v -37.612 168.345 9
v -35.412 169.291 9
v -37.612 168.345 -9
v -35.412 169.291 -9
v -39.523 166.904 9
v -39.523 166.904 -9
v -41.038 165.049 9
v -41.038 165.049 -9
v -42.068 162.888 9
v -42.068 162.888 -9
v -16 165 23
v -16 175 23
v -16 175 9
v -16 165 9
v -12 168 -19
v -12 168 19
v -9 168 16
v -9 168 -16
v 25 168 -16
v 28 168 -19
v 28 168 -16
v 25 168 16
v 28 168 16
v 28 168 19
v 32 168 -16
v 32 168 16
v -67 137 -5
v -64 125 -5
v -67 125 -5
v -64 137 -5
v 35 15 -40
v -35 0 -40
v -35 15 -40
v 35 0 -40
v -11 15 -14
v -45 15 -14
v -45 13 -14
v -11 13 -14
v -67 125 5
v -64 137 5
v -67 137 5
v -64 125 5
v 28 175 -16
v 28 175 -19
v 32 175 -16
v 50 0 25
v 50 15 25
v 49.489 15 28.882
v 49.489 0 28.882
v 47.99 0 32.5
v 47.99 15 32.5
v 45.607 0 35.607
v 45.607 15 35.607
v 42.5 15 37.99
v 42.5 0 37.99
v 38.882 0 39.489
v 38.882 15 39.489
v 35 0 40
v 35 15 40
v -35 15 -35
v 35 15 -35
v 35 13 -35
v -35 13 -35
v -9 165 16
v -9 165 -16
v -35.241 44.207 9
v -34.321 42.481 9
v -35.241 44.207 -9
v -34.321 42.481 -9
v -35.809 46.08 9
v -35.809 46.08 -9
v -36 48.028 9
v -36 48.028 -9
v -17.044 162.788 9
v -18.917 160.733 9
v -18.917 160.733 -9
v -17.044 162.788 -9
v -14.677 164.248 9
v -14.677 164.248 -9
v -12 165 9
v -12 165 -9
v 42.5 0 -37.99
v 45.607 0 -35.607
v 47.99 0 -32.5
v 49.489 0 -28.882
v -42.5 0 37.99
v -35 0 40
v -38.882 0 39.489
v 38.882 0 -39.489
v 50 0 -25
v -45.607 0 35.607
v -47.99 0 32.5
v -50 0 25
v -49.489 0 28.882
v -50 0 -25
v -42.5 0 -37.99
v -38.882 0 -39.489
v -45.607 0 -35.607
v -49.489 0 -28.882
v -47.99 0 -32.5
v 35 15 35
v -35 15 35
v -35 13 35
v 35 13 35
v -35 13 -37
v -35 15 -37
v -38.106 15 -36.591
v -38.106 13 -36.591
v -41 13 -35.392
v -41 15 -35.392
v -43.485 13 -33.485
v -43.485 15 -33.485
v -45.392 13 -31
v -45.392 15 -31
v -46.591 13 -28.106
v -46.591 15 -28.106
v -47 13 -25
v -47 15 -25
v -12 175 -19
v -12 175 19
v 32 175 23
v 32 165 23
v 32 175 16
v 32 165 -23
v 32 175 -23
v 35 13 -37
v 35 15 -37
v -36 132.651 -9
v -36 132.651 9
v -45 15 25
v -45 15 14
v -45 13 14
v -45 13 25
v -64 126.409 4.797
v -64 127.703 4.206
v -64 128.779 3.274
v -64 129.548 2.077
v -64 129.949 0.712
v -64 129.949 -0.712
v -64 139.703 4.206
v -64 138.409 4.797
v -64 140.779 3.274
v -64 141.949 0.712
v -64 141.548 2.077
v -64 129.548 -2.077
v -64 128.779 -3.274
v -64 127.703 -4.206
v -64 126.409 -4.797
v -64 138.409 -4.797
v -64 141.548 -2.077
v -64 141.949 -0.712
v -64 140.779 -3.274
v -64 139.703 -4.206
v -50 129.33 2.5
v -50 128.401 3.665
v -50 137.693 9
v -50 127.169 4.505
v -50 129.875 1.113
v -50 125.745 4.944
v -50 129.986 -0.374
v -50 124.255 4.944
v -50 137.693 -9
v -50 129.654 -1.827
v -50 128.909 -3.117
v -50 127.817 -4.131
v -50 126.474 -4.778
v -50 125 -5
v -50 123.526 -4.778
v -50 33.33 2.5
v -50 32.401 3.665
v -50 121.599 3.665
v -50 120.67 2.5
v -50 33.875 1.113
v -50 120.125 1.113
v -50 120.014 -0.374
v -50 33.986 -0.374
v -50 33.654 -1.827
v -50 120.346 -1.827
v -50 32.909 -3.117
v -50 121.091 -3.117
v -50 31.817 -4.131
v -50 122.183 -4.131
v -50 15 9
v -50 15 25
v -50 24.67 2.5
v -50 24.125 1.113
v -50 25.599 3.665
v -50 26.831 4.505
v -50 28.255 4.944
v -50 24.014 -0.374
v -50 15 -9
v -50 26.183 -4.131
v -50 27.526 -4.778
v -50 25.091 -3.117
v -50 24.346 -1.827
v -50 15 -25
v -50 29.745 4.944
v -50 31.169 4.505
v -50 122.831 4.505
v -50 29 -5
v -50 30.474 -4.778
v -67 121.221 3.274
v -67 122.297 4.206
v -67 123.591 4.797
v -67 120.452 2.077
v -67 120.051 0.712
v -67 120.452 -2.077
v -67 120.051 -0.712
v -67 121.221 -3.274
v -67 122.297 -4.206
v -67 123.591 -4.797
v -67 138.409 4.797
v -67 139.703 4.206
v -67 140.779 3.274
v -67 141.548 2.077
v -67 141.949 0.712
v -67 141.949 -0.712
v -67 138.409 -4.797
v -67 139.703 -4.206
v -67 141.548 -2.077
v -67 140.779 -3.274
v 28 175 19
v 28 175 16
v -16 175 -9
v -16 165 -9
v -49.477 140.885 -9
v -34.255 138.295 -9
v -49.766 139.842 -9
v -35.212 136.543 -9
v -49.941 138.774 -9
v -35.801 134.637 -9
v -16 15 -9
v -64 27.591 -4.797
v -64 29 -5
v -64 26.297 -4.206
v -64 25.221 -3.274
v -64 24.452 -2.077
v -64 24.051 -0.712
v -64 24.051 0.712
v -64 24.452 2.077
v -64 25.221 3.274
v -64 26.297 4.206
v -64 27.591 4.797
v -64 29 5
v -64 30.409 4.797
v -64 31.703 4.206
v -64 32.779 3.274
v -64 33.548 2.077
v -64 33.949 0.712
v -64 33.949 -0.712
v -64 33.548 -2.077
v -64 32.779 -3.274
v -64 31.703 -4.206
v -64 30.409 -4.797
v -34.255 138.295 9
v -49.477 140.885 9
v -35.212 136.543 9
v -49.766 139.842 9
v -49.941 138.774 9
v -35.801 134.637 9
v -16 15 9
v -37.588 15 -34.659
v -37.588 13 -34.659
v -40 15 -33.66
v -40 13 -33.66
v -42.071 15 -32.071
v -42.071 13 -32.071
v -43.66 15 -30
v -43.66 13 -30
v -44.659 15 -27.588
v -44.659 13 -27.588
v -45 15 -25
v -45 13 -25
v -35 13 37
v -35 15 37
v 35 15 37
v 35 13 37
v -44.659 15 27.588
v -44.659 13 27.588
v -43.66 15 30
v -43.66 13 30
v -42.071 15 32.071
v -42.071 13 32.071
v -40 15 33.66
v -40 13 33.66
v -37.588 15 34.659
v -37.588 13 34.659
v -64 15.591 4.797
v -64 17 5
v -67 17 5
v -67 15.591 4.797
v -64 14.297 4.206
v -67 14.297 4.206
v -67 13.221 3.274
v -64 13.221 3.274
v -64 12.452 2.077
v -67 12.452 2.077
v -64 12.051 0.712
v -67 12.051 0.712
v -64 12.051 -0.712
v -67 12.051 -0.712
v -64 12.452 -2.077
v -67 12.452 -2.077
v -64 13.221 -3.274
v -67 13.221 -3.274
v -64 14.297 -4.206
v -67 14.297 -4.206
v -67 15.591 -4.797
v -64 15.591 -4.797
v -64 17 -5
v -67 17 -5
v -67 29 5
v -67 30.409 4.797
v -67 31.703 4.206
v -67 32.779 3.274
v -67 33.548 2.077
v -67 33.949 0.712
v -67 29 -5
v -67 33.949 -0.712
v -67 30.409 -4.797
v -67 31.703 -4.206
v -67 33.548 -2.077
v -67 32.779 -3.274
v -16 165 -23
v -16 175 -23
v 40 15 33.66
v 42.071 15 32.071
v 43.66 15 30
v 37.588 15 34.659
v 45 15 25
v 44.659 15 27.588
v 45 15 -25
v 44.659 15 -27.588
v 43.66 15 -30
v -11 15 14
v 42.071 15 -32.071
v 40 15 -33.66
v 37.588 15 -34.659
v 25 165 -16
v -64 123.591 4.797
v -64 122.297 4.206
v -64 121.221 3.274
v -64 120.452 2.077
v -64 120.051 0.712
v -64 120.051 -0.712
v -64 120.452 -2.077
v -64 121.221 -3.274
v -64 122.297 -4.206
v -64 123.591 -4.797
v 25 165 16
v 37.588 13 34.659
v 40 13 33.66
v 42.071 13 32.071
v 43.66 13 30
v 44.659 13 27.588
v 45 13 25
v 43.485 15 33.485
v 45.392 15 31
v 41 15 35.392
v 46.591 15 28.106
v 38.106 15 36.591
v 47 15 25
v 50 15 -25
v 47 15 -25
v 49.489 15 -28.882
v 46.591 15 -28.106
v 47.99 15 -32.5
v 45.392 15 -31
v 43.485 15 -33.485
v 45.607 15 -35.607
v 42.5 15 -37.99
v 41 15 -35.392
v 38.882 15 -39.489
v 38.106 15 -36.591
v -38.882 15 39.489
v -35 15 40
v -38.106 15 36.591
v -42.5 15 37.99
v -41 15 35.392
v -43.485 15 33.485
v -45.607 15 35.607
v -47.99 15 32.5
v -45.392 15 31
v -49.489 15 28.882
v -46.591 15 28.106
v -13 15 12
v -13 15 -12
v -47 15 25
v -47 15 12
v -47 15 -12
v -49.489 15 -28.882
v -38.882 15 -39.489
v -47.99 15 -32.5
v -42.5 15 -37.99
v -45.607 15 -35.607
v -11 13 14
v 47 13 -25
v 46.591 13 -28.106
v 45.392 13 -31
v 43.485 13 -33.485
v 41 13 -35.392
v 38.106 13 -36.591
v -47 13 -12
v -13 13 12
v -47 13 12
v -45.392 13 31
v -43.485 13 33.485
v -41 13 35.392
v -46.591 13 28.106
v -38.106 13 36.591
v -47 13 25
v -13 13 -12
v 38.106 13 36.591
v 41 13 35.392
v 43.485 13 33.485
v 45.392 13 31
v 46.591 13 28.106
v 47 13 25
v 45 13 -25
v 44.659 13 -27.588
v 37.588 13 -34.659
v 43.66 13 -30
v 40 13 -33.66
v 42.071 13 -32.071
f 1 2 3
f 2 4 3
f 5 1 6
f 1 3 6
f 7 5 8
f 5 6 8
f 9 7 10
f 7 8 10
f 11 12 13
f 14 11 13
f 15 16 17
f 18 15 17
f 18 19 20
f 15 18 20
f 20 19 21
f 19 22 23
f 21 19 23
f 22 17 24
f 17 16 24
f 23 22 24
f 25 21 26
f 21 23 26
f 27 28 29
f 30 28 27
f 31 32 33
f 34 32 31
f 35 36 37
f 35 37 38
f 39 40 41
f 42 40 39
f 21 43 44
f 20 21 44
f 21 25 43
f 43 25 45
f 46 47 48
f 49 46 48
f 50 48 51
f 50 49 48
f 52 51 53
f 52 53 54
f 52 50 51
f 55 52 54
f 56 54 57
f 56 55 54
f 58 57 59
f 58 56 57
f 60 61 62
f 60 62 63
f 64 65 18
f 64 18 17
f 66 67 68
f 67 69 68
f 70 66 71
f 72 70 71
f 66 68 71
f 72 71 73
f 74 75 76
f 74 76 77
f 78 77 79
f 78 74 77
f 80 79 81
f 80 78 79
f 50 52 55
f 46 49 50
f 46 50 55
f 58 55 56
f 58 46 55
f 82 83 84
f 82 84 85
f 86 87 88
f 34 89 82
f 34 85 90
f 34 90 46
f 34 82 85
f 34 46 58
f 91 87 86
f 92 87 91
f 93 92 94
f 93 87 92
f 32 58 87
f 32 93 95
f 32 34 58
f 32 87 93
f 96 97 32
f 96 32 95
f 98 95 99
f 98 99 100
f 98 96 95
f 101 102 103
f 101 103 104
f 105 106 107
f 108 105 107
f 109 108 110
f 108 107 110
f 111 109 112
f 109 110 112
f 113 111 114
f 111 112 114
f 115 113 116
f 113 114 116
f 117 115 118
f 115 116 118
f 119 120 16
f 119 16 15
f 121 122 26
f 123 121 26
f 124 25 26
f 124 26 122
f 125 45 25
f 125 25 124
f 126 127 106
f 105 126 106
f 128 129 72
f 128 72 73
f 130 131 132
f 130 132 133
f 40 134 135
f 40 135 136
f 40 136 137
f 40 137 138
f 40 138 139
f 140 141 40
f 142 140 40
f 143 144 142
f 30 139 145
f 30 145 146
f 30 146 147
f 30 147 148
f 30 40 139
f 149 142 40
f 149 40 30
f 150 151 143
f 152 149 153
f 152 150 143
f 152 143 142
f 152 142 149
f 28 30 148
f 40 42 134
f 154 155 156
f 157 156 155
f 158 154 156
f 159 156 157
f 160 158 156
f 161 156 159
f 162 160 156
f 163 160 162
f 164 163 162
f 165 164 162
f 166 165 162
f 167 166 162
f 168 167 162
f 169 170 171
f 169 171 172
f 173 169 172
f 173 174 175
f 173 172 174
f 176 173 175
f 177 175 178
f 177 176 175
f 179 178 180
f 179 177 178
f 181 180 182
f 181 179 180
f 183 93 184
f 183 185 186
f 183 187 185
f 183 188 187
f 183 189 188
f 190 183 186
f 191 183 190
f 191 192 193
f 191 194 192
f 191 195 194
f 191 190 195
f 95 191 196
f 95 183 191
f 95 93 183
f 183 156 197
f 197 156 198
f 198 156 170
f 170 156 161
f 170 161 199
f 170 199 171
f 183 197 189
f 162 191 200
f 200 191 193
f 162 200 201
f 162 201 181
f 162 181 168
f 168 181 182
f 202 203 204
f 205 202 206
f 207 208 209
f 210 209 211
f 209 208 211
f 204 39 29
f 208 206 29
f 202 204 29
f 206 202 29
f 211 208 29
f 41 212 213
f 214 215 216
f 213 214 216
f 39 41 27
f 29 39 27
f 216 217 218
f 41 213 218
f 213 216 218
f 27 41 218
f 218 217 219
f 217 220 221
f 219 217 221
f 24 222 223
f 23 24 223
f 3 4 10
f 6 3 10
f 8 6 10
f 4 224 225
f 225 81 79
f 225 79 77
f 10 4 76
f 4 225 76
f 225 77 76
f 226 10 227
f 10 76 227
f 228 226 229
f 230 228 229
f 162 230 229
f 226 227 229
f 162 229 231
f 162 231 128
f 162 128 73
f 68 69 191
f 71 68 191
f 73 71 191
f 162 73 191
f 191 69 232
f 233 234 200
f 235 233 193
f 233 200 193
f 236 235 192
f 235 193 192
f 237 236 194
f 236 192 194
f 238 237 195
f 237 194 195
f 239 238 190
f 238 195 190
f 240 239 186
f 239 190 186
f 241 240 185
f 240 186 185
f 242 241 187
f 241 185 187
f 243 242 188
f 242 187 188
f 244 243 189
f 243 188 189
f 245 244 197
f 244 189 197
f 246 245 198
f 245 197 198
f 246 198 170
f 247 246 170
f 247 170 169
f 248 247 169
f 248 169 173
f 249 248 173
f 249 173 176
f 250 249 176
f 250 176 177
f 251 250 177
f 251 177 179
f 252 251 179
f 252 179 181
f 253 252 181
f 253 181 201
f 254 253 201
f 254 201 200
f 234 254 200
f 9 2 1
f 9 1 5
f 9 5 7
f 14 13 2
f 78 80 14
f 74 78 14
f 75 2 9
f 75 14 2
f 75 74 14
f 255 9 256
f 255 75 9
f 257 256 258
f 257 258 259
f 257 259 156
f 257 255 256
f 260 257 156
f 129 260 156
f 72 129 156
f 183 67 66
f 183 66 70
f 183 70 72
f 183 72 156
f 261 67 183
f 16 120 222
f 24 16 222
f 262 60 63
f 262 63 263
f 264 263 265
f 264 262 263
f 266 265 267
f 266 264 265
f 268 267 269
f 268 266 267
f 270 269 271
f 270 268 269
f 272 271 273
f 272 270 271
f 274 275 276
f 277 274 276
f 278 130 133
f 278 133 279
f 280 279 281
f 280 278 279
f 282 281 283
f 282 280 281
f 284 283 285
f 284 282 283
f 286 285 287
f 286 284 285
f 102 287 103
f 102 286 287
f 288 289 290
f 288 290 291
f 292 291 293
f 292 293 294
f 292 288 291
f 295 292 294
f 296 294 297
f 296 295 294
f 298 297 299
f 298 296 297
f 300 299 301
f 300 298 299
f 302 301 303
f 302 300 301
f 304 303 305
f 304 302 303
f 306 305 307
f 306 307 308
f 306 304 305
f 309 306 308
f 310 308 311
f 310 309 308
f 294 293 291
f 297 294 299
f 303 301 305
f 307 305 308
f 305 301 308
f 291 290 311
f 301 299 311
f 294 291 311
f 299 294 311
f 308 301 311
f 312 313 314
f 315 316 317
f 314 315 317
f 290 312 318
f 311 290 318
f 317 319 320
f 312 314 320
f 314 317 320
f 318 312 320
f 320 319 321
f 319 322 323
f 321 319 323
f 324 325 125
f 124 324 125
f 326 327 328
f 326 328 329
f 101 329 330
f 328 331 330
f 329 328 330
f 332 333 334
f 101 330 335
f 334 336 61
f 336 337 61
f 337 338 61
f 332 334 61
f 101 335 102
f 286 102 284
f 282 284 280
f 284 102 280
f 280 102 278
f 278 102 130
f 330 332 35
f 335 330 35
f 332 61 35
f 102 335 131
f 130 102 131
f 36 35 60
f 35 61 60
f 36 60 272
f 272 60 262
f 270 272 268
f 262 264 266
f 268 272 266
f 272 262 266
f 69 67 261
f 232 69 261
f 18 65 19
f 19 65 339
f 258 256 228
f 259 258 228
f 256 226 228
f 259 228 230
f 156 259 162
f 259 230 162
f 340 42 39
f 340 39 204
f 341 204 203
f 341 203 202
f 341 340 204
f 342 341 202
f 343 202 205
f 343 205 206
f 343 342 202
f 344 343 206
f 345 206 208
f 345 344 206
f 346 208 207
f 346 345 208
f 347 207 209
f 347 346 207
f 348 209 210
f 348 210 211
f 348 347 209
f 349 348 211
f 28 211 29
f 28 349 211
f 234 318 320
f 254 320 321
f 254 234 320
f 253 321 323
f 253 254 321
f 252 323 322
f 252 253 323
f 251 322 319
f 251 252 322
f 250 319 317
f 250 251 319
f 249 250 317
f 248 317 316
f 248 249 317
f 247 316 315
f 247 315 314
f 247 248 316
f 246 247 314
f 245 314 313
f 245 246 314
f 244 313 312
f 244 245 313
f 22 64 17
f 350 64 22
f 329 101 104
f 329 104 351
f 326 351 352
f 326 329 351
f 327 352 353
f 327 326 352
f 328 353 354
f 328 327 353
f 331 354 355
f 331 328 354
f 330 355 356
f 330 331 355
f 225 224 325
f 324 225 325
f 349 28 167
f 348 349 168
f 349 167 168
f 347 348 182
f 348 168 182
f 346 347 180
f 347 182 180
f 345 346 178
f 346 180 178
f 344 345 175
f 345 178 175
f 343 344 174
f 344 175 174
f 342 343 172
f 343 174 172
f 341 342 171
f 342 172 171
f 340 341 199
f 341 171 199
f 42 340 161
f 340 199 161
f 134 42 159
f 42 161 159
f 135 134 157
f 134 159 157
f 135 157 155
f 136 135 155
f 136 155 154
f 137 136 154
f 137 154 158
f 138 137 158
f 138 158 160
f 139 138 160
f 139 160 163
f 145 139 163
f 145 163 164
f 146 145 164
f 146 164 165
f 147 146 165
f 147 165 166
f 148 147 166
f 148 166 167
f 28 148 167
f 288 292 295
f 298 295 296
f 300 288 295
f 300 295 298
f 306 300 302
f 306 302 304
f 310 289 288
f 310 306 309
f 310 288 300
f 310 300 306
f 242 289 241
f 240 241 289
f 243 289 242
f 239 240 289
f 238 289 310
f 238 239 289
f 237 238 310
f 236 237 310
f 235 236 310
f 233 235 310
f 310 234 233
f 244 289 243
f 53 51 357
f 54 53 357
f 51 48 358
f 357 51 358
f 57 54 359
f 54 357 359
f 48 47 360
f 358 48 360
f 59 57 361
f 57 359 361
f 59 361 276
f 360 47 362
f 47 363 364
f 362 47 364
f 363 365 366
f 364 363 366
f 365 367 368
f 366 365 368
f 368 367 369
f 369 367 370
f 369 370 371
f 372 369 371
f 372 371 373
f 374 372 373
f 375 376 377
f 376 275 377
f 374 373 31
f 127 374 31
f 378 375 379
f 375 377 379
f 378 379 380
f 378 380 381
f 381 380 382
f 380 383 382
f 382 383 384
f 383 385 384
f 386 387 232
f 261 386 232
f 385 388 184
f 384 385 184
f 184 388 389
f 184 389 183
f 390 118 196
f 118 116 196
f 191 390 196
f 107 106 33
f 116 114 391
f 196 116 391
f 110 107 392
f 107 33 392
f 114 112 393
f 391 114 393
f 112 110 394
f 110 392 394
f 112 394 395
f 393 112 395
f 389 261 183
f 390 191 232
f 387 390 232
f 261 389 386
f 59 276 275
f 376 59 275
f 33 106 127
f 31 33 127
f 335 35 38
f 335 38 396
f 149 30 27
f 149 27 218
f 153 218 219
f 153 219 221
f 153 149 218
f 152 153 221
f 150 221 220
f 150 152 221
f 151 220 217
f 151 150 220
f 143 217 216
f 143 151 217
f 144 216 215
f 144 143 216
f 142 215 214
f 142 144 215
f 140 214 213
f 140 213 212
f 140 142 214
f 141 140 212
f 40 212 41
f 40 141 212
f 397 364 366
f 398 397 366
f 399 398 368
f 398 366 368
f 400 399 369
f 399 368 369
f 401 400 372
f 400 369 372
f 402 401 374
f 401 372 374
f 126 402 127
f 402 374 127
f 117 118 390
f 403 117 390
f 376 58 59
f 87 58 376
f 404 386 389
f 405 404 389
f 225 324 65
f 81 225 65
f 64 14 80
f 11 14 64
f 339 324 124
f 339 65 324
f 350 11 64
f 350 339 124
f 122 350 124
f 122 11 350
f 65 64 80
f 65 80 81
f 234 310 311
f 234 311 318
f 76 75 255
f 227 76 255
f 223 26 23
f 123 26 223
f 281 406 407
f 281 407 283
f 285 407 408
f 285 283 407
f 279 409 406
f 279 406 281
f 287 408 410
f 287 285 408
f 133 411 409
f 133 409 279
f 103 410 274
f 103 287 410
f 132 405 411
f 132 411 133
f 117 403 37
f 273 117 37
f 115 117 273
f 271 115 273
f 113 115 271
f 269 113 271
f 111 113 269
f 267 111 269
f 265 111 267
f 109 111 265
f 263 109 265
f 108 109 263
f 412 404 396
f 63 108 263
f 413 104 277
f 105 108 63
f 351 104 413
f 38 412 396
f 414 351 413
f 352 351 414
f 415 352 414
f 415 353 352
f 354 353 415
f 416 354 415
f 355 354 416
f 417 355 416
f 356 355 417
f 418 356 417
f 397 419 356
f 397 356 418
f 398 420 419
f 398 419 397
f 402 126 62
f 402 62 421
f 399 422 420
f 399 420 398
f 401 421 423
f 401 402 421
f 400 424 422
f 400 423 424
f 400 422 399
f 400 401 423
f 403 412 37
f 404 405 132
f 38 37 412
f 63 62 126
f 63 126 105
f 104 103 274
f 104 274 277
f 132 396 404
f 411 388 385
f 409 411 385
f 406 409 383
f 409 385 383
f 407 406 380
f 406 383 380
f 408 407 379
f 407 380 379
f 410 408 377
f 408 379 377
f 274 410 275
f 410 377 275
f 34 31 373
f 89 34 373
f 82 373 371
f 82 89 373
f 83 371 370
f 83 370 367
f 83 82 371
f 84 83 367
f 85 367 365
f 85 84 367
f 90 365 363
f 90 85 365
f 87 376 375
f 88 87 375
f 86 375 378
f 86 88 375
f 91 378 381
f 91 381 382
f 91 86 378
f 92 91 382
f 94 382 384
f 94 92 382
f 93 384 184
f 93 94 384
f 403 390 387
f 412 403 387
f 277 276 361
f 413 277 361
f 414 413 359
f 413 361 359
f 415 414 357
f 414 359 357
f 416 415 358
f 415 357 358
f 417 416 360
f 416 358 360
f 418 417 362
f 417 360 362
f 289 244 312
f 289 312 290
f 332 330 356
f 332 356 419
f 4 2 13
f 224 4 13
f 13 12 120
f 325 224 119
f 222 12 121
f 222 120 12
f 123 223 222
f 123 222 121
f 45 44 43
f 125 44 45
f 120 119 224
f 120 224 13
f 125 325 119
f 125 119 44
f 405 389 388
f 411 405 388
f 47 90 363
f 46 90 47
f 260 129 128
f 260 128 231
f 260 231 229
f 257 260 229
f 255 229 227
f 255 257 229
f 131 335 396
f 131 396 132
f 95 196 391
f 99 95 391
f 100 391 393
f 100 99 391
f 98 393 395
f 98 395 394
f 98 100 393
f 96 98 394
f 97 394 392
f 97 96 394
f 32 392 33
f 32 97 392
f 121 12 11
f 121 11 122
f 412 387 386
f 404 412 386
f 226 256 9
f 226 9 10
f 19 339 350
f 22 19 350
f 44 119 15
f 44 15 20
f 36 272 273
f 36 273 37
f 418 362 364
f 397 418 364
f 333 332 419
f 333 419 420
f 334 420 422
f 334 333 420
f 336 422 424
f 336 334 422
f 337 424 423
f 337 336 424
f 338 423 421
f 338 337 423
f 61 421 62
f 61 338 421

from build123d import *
from build123d.topology import SkipClean

# Parameters (mm, degrees)
BOSS_EXTRUDE1_DEPTH  = 15
SKETCH3_W            = 14
SKETCH3_H            = 18
BOSS_EXTRUDE2_DEPTH  = 150
BOSS_EXTRUDE3_DEPTH  = 18
SKETCH7_W            = 48
SKETCH7_H            = 46
SKETCH7_W_2          = 40
SKETCH7_H_2          = 38
BOSS_EXTRUDE4_DEPTH  = 10
BOSS_EXTRUDE5_DEPTH  = 18
FILLET2_R            = 10
CHAMFER2_SIZE        = 10
CHAMFER2_SIZE2       = 25.668100083
FILLET3_R            = 10
FILLET4_R            = 10
SKETCH11_W           = 40
SKETCH11_H           = 38
SKETCH11_W_2         = 34
SKETCH11_H_2         = 32
BOSS_EXTRUDE6_DEPTH  = 3
SKETCH12_W           = 32
SKETCH12_H           = 7
CUT_EXTRUDE2_DEPTH   = 5
CUT_EXTRUDE3_DEPTH   = 2
SKETCH15_R           = 5
BOSS_EXTRUDE8_DEPTH  = 14
BOSS_EXTRUDE10_DEPTH = 3


with BuildPart() as part:
    # Sketch1 → Boss-Extrude1 (new body)
    with BuildSketch(Plane(origin=(0, 0, 0), x_dir=(1, 0, 0), z_dir=(0, 1, 0))):
        with BuildLine():
            Line((35, -40), (-35, -40))
            ThreePointArc((-35, -40), (-45.606601718, -35.606601718), (-50, -25))
            Line((-50, -25), (-50, 25))
            ThreePointArc((-50, 25), (-45.606601718, 35.606601718), (-35, 40))
            Line((-35, 40), (35, 40))
            ThreePointArc((35, 40), (45.606601718, 35.606601718), (50, 25))
            Line((50, 25), (50, -25))
            ThreePointArc((50, -25), (45.606601718, -35.606601718), (35, -40))
        make_face()
    extrude(amount=BOSS_EXTRUDE1_DEPTH)

    # Sketch3 → Boss-Extrude2 (add)
    with BuildSketch(Plane(origin=(0, 15, 0), x_dir=(1, 0, 0), z_dir=(0, 1, 0))):
        with Locations((-43, 0)):
            Rectangle(SKETCH3_W, SKETCH3_H)
    extrude(amount=BOSS_EXTRUDE2_DEPTH)

    # Sketch5 → Boss-Extrude3 (add)
    with BuildSketch(Plane.XY.offset(9)):
        Polygon((-36, 15), (-36, 45), (-16, 15), align=None)
    extrude(amount=-BOSS_EXTRUDE3_DEPTH)



with BuildPart() as body_2:
    # Sketch7 → Boss-Extrude4 (new body)
    with BuildSketch(Plane(origin=(0, 175, 0), x_dir=(1, 0, 0), z_dir=(0, 1, 0))):
        with Locations((8, 0)):
            Rectangle(SKETCH7_W, SKETCH7_H)
        with Locations((8, 0)):
            Rectangle(SKETCH7_W_2, SKETCH7_H_2, mode=Mode.SUBTRACT)
    extrude(amount=-BOSS_EXTRUDE4_DEPTH)


with BuildPart() as part_1:
    add(part.part)

    add(body_2.part)  # Boss-Extrude5 merges body 2
    # Sketch8 → Boss-Extrude5 (add)
    with BuildSketch(Plane.XY.offset(9)):
        Polygon((-50, 165), (-16, 175), (-16, 165), (-36, 135.742522323), (-36, 165), align=None)
    extrude(amount=-BOSS_EXTRUDE5_DEPTH)

    # Fillet2
    # the kernel refuses this fillet: 10 mm, written as the material it adds along each edge
    with BuildSketch(Plane(origin=(-16, 165, 9), x_dir=(1, 0, 0), z_dir=(0, 0, -1))) as fillet2_piece_1:
        with BuildLine():
            CenterArc((5.338859158, 9.909967515), FILLET2_R, 214.35596202, 47.949835241)
            Line((-2.916615768, 4.266641036), (0, 0))
            Line((0, 0), (4, 0))
        make_face()
    extrude(amount=18)
    with BuildSketch(Plane(origin=(-36, 135.742522323, 9), x_dir=(0.5643326479831027, 0.825547492528673, 0), z_dir=(0, 0, -1))) as fillet2_piece_2:
        with BuildLine():
            CenterArc((FILLET2_R * 0.309130630834, FILLET2_R), FILLET2_R, 235.64403798, 34.35596202)
            Line((-FILLET2_R * 0.255202017149, FILLET2_R * 0.174452507471), (0, 0))
            Line((0, 0), (FILLET2_R * 0.309130630834, 0))
        make_face()
    extrude(amount=18)

    # Chamfer2
    chamfer2_edges = [part_1.edges().sort_by_distance(p)[0] for p in [
        (-50, 165, 0),
    ]]
    chamfer2_side = [part_1.faces().sort_by_distance(p)[0] for p in [
        (-33, 170, 0),
    ]]
    chamfer(chamfer2_edges, length=CHAMFER2_SIZE, length2=CHAMFER2_SIZE2, reference=chamfer2_side[0])

    # Fillet3
    fillet3_edges = [part_1.edges().sort_by_distance(p)[0] for p in [
        (-50, 139.331899917, 0),
        (-40.406344984, 167.82166324, 0),
    ]]
    fillet(fillet3_edges, radius=FILLET3_R)

    # Fillet4
    fillet4_edges = [part_1.edges().sort_by_distance(p)[0] for p in [
        (-36, 45, 0),
    ]]
    fillet(fillet4_edges, radius=FILLET4_R)

    # Sketch11 → Boss-Extrude6 (add)
    with BuildSketch(Plane.XZ.offset(-165)):
        with Locations((8, 0)):
            Rectangle(SKETCH11_W, SKETCH11_H)
        with Locations((8, 0)):
            Rectangle(SKETCH11_W_2, SKETCH11_H_2, mode=Mode.SUBTRACT)
    extrude(amount=-BOSS_EXTRUDE6_DEPTH)

    # Sketch12 → Cut-Extrude2 (cut)
    with BuildSketch(Plane(origin=(32, 0, 0), x_dir=(0, 0, -1), z_dir=(1, 0, 0))):
        with Locations((0, 171.5)):
            Rectangle(SKETCH12_W, SKETCH12_H)
    extrude(amount=-CUT_EXTRUDE2_DEPTH, mode=Mode.SUBTRACT)

    # Sketch13 → Cut-Extrude3 (cut)
    with BuildSketch(Plane(origin=(0, 15, 0), x_dir=(1, 0, 0), z_dir=(0, 1, 0))):
        with BuildLine():
            Line((-47, 12), (-13, 12))
            Line((-13, 12), (-13, -12))
            Line((-13, -12), (-47, -12))
            Line((-47, -12), (-47, -25))
            ThreePointArc((-47, -25), (-43.485281374, -33.485281374), (-35, -37))
            Line((-35, -37), (35, -37))
            ThreePointArc((35, -37), (43.485281374, -33.485281374), (47, -25))
            Line((47, -25), (47, 25))
            ThreePointArc((47, 25), (43.485281374, 33.485281374), (35, 37))
            Line((35, 37), (-35, 37))
            ThreePointArc((-35, 37), (-43.485281374, 33.485281374), (-47, 25))
            Line((-47, 25), (-47, 12))
        make_face()
        with BuildLine():
            Line((-45, 14), (-11, 14))
            Line((-11, 14), (-11, -14))
            Line((-11, -14), (-45, -14))
            Line((-45, -14), (-45, -25))
            ThreePointArc((-45, -25), (-42.071067812, -32.071067812), (-35, -35))
            Line((-35, -35), (35, -35))
            ThreePointArc((35, -35), (42.071067812, -32.071067812), (45, -25))
            Line((45, -25), (45, 25))
            ThreePointArc((45, 25), (42.071067812, 32.071067812), (35, 35))
            Line((35, 35), (-35, 35))
            ThreePointArc((-35, 35), (-42.071067812, 32.071067812), (-45, 25))
            Line((-45, 25), (-45, 14))
        make_face(mode=Mode.SUBTRACT)
    extrude(amount=-CUT_EXTRUDE3_DEPTH, mode=Mode.SUBTRACT)

    # Sketch15 → Boss-Extrude8 (add)
    with BuildSketch(Plane.ZY.offset(50)):
        with Locations(Location((0, 125, 0), (0, 0, 180))):
            Circle(SKETCH15_R)
        with Locations(Location((0, 29, 0), (0, 0, 180))):
            Circle(SKETCH15_R)
    extrude(amount=BOSS_EXTRUDE8_DEPTH)

    # Sketch16 → Boss-Extrude10 (add)
    with SkipClean():  # the faces are left unmerged after this step: merging them gives an invalid solid
        with BuildSketch(Plane.ZY.offset(64)):
            with BuildLine():
                Line((-5, 125), (-5, 137))
                ThreePointArc((-5, 137), (0, 142), (5, 137))
                Line((5, 137), (5, 125))
                ThreePointArc((5, 125), (0, 120), (-5, 125))
            make_face()
            with BuildLine():
                Line((-5, 17), (-5, 29))
                ThreePointArc((-5, 29), (0, 34), (5, 29))
                Line((5, 29), (5, 17))
                ThreePointArc((5, 17), (0, 12), (-5, 17))
            make_face()
        extrude(amount=BOSS_EXTRUDE10_DEPTH)
    add(part_1.part.scale(1), mode=Mode.REPLACE)  # the faces are merged on a copy


solid = part_1.part
